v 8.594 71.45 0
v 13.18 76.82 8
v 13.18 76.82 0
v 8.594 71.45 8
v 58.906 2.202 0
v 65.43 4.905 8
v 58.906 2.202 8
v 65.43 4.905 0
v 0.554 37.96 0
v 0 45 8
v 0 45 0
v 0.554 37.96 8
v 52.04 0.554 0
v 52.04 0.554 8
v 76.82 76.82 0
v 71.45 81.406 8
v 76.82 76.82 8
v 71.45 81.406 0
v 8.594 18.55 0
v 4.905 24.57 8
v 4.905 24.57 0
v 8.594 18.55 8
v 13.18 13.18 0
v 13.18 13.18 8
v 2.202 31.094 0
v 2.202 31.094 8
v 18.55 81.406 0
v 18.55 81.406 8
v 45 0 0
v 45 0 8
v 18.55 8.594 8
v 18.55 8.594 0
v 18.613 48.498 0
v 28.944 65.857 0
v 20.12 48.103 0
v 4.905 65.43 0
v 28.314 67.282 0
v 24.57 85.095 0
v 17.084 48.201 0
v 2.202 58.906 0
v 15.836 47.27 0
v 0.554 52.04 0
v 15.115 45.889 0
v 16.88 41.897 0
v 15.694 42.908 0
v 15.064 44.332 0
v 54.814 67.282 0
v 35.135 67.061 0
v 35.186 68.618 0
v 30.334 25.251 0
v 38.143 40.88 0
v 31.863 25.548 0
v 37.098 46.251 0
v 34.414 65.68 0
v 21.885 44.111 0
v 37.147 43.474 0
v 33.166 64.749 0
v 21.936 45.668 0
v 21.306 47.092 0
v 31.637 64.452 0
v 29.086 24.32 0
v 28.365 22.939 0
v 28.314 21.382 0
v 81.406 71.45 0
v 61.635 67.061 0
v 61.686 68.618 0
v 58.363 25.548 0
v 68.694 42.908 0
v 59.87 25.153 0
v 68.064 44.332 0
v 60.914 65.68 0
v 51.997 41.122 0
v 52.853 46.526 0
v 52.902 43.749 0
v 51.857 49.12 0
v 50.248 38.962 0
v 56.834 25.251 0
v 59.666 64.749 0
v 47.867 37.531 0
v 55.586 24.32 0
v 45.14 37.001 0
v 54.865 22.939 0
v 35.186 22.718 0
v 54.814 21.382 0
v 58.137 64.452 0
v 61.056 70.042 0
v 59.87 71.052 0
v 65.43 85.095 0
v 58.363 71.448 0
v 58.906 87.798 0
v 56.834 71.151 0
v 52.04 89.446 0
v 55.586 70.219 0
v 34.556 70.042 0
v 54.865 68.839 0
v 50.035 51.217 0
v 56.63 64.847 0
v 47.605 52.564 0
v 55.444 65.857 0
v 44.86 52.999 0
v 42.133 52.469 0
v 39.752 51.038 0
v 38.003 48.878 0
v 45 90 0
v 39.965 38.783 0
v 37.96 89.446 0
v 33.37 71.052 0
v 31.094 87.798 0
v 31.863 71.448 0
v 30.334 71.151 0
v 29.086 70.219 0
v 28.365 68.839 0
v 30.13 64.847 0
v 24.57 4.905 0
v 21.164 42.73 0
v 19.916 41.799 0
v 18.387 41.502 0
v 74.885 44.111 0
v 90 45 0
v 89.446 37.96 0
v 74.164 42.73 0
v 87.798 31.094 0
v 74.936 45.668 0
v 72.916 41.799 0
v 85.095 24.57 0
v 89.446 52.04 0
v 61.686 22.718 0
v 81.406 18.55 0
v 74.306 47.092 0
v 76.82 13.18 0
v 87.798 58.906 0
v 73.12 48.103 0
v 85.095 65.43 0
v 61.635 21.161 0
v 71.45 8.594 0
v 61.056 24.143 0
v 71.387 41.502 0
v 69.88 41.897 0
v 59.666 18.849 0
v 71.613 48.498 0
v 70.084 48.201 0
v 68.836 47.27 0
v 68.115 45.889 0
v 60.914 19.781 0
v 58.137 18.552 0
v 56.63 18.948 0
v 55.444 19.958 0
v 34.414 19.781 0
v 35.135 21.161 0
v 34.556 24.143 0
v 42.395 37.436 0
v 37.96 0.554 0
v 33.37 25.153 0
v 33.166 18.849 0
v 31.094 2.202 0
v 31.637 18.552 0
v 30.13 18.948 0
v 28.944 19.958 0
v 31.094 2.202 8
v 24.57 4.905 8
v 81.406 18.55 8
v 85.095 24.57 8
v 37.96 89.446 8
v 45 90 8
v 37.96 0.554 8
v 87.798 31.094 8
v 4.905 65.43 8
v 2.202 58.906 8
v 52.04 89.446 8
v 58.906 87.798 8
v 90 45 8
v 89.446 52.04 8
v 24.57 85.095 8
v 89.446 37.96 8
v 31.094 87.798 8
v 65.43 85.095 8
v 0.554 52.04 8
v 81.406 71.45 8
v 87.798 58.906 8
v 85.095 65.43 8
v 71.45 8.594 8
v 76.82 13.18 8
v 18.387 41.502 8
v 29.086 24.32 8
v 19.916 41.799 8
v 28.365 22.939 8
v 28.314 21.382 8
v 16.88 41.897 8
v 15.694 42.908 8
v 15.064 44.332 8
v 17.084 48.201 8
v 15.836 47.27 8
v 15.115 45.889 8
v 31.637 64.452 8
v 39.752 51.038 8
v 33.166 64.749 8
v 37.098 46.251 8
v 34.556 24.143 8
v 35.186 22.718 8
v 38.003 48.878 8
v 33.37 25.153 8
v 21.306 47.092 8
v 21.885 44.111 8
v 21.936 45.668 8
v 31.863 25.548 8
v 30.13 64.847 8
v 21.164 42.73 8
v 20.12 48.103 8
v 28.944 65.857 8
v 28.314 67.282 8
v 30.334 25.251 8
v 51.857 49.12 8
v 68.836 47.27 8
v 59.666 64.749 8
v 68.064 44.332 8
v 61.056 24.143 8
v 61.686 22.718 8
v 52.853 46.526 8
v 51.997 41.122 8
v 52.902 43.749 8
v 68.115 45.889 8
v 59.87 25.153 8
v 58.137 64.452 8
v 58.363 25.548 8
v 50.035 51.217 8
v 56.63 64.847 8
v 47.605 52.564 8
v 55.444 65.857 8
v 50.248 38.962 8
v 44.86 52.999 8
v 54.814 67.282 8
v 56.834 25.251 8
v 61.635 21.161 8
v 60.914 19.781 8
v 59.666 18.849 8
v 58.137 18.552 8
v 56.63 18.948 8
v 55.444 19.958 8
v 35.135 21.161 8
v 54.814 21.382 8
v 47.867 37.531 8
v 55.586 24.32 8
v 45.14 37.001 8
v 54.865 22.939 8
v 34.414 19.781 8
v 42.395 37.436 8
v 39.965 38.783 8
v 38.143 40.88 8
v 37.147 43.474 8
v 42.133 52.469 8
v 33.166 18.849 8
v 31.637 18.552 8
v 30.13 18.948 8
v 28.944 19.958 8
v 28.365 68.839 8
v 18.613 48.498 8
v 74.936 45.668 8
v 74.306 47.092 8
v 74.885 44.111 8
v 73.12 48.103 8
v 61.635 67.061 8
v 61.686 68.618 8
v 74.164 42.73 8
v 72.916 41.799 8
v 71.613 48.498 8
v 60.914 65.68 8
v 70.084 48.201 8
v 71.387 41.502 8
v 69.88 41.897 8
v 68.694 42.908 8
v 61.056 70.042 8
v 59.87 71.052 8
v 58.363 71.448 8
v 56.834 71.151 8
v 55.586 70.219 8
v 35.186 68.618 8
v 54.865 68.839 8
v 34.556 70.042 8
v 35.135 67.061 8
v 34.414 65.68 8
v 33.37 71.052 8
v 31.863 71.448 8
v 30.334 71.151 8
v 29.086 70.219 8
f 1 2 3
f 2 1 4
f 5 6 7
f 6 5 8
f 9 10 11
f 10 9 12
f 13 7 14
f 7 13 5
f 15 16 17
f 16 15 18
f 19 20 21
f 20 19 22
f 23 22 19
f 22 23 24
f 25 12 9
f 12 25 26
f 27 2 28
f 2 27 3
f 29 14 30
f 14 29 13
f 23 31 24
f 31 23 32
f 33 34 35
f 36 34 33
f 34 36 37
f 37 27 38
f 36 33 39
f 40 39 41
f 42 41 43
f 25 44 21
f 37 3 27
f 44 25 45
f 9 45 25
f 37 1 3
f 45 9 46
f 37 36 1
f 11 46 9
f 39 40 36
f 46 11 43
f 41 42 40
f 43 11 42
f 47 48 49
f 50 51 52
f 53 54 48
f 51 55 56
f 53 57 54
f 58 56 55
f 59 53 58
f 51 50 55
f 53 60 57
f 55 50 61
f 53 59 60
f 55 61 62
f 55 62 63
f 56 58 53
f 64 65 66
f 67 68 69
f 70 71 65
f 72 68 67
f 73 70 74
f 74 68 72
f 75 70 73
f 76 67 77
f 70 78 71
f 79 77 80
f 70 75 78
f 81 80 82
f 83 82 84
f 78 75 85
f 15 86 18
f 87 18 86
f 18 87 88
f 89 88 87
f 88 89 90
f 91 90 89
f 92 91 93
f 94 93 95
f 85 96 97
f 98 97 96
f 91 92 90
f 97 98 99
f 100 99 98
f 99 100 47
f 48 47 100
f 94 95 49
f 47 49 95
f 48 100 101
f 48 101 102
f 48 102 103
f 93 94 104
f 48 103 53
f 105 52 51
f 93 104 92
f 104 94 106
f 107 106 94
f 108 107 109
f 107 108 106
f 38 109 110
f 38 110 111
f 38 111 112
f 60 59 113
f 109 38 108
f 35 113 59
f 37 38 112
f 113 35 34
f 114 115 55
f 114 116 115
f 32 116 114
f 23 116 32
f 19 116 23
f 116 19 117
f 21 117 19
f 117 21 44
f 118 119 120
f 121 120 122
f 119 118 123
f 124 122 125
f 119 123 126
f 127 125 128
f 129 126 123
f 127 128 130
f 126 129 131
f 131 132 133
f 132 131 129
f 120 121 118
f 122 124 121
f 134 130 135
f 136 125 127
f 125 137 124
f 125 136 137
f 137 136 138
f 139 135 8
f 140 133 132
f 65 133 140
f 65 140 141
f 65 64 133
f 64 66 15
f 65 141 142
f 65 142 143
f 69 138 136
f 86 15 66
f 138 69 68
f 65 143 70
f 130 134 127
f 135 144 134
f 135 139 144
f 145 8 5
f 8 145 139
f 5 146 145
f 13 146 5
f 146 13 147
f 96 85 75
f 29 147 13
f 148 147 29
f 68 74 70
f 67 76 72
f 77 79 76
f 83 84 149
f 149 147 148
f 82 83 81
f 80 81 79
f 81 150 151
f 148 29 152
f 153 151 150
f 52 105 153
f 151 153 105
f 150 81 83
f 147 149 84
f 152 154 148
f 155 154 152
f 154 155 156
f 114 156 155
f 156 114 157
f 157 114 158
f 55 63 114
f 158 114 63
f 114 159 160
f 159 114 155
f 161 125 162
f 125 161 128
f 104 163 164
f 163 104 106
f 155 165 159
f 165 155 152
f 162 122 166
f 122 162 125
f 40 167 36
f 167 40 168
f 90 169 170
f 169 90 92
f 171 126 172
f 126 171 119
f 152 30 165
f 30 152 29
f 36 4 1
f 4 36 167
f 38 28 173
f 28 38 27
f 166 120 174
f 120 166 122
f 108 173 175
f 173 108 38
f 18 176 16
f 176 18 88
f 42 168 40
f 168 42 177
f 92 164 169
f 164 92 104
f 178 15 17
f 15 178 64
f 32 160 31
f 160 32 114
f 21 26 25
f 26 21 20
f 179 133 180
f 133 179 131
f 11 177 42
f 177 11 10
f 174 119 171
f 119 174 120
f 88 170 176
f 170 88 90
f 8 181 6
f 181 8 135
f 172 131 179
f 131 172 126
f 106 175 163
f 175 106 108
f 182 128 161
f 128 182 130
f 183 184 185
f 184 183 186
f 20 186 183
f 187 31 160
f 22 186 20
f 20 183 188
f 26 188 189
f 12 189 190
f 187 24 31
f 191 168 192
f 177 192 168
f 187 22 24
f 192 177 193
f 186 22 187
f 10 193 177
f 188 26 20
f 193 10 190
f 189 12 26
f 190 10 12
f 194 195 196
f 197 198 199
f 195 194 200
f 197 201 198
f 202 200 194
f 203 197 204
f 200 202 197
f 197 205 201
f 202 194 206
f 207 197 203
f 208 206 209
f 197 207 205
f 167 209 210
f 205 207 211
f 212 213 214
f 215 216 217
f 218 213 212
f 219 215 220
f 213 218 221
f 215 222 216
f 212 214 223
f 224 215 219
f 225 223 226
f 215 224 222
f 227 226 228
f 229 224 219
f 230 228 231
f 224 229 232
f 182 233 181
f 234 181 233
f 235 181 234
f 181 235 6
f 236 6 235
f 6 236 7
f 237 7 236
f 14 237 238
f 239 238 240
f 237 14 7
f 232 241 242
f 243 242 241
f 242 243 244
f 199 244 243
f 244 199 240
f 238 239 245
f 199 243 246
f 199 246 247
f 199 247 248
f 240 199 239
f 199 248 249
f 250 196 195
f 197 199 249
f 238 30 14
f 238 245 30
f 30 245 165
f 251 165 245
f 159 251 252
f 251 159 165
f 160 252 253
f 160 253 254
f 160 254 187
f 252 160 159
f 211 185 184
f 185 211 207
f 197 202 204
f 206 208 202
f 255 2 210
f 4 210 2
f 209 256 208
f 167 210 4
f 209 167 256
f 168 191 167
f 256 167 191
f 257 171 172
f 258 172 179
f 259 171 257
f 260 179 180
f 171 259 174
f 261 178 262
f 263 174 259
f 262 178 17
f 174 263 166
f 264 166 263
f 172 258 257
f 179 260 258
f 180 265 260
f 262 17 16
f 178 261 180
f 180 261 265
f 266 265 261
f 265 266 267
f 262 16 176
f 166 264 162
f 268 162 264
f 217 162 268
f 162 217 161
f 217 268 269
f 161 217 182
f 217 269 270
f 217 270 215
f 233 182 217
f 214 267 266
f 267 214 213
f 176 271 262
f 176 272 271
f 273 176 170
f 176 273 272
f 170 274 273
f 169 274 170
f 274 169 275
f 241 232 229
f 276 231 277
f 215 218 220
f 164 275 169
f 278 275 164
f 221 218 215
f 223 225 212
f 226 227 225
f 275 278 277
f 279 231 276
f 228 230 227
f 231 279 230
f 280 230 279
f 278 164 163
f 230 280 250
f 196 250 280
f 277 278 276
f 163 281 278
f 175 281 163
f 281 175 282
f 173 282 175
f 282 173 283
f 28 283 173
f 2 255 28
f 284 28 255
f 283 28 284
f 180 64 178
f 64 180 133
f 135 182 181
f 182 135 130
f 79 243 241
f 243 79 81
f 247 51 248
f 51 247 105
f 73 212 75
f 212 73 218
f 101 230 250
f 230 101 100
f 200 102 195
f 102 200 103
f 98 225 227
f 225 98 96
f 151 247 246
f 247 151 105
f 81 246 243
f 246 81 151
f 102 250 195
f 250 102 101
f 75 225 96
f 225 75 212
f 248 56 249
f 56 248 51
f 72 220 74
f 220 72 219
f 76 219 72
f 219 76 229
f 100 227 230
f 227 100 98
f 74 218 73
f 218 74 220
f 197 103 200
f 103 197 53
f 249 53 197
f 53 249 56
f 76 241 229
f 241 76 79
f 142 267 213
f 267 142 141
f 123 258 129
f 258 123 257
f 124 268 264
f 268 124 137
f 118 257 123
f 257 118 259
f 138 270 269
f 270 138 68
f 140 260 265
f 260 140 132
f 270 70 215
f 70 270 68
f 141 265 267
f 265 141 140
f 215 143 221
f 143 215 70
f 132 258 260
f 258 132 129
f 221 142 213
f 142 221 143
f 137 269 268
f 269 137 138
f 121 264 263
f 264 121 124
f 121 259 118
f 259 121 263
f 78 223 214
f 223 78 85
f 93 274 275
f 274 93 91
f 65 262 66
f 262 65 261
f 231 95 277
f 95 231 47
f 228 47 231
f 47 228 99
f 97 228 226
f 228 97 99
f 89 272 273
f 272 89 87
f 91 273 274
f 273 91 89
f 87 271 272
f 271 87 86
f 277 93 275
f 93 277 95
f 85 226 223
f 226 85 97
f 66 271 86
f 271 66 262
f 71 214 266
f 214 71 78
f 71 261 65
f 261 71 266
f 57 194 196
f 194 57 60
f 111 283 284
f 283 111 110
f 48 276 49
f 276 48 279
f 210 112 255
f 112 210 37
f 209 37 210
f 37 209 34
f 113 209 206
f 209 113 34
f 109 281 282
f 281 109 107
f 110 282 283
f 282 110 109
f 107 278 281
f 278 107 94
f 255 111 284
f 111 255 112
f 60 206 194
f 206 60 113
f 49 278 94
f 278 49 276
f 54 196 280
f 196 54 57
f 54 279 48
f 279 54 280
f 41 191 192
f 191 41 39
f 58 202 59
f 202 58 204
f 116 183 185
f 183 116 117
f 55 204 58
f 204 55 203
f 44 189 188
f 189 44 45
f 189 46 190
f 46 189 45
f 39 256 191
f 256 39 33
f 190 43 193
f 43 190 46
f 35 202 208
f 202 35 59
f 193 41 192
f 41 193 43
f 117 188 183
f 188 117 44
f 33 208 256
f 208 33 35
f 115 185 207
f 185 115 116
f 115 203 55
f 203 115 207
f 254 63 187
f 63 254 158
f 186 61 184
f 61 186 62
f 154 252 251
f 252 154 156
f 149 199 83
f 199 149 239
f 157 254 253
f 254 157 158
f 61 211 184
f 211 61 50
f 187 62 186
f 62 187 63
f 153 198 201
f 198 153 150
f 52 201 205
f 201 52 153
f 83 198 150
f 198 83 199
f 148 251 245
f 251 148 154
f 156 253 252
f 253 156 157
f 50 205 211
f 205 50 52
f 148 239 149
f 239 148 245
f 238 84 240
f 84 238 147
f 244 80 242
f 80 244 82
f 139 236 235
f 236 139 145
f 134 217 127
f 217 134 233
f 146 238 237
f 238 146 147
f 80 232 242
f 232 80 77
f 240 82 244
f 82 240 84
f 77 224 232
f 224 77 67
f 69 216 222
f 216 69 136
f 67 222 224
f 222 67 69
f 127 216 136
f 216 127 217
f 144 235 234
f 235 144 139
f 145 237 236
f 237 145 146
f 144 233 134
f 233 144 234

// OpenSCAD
$fn = 32;

// ----------------------------------------------------------------------
// Spacer plate: round flange R45, 6 bolts
// ----------------------------------------------------------------------

// --- parameters (mm) ---
bore_r = 8;               // centre bore radius
bolt_r = 3.5;             // bolt hole radius
plate_t = 8;              // plate thickness, Z (extrusion height)
flange_r = 45;            // flange radius
n_bolt = 6;               // bolt hole count
ring_r = 26.5;            // bolt circle radius

profile = [[90, 45], [89.446, 52.04], [87.798, 58.906], [85.095, 65.43], [81.406, 71.45], [76.82, 76.82], [71.45, 81.406], [65.43, 85.095], [58.906, 87.798], [52.04, 89.446], [45, 90], [37.96, 89.446], [31.094, 87.798], [24.57, 85.095], [18.55, 81.406], [13.18, 76.82], [8.594, 71.45], [4.905, 65.43], [2.202, 58.906], [0.554, 52.04], [0, 45], [0.554, 37.96], [2.202, 31.094], [4.905, 24.57], [8.594, 18.55], [13.18, 13.18], [18.55, 8.594], [24.57, 4.905], [31.094, 2.202], [37.96, 0.554], [45, 0], [52.04, 0.554], [58.906, 2.202], [65.43, 4.905], [71.45, 8.594], [76.82, 13.18], [81.406, 18.55], [85.095, 24.57], [87.798, 31.094], [89.446, 37.96]];  // primary outline, 40 points, counter clockwise
void_1 = [[52.853, 46.526], [51.857, 49.12], [50.035, 51.217], [47.605, 52.564], [44.86, 52.999], [42.133, 52.469], [39.752, 51.038], [38.003, 48.878], [37.098, 46.251], [37.147, 43.474], [38.143, 40.88], [39.965, 38.783], [42.395, 37.436], [45.14, 37.001], [47.867, 37.531], [50.248, 38.962], [51.997, 41.122], [52.902, 43.749]];  // centre bore, 18 points
void_2 = [[74.936, 45.668], [74.306, 47.092], [73.12, 48.103], [71.613, 48.498], [70.084, 48.201], [68.836, 47.27], [68.115, 45.889], [68.064, 44.332], [68.694, 42.908], [69.88, 41.897], [71.387, 41.502], [72.916, 41.799], [74.164, 42.73], [74.885, 44.111]];  // bolt hole 1, 14 points
void_3 = [[61.686, 68.618], [61.056, 70.042], [59.87, 71.052], [58.363, 71.448], [56.834, 71.151], [55.586, 70.219], [54.865, 68.839], [54.814, 67.282], [55.444, 65.857], [56.63, 64.847], [58.137, 64.452], [59.666, 64.749], [60.914, 65.68], [61.635, 67.061]];  // bolt hole 2, 14 points
void_4 = [[35.186, 68.618], [34.556, 70.042], [33.37, 71.052], [31.863, 71.448], [30.334, 71.151], [29.086, 70.219], [28.365, 68.839], [28.314, 67.282], [28.944, 65.857], [30.13, 64.847], [31.637, 64.452], [33.166, 64.749], [34.414, 65.68], [35.135, 67.061]];  // bolt hole 3, 14 points
void_5 = [[21.936, 45.668], [21.306, 47.092], [20.12, 48.103], [18.613, 48.498], [17.084, 48.201], [15.836, 47.27], [15.115, 45.889], [15.064, 44.332], [15.694, 42.908], [16.88, 41.897], [18.387, 41.502], [19.916, 41.799], [21.164, 42.73], [21.885, 44.111]];  // bolt hole 4, 14 points
void_6 = [[35.186, 22.718], [34.556, 24.143], [33.37, 25.153], [31.863, 25.548], [30.334, 25.251], [29.086, 24.32], [28.365, 22.939], [28.314, 21.382], [28.944, 19.958], [30.13, 18.948], [31.637, 18.552], [33.166, 18.849], [34.414, 19.781], [35.135, 21.161]];  // bolt hole 5, 14 points
void_7 = [[61.686, 22.718], [61.056, 24.143], [59.87, 25.153], [58.363, 25.548], [56.834, 25.251], [55.586, 24.32], [54.865, 22.939], [54.814, 21.382], [55.444, 19.958], [56.63, 18.948], [58.137, 18.552], [59.666, 18.849], [60.914, 19.781], [61.635, 21.161]];  // bolt hole 6, 14 points

// --- the one profile operation ---
difference() {
  linear_extrude(height = plate_t) polygon(points = profile);
  translate([0, 0, -1])
    linear_extrude(height = plate_t + 2) polygon(points = void_1);
  translate([0, 0, -1])
    linear_extrude(height = plate_t + 2) polygon(points = void_2);
  translate([0, 0, -1])
    linear_extrude(height = plate_t + 2) polygon(points = void_3);
  translate([0, 0, -1])
    linear_extrude(height = plate_t + 2) polygon(points = void_4);
  translate([0, 0, -1])
    linear_extrude(height = plate_t + 2) polygon(points = void_5);
  translate([0, 0, -1])
    linear_extrude(height = plate_t + 2) polygon(points = void_6);
  translate([0, 0, -1])
    linear_extrude(height = plate_t + 2) polygon(points = void_7);
}
